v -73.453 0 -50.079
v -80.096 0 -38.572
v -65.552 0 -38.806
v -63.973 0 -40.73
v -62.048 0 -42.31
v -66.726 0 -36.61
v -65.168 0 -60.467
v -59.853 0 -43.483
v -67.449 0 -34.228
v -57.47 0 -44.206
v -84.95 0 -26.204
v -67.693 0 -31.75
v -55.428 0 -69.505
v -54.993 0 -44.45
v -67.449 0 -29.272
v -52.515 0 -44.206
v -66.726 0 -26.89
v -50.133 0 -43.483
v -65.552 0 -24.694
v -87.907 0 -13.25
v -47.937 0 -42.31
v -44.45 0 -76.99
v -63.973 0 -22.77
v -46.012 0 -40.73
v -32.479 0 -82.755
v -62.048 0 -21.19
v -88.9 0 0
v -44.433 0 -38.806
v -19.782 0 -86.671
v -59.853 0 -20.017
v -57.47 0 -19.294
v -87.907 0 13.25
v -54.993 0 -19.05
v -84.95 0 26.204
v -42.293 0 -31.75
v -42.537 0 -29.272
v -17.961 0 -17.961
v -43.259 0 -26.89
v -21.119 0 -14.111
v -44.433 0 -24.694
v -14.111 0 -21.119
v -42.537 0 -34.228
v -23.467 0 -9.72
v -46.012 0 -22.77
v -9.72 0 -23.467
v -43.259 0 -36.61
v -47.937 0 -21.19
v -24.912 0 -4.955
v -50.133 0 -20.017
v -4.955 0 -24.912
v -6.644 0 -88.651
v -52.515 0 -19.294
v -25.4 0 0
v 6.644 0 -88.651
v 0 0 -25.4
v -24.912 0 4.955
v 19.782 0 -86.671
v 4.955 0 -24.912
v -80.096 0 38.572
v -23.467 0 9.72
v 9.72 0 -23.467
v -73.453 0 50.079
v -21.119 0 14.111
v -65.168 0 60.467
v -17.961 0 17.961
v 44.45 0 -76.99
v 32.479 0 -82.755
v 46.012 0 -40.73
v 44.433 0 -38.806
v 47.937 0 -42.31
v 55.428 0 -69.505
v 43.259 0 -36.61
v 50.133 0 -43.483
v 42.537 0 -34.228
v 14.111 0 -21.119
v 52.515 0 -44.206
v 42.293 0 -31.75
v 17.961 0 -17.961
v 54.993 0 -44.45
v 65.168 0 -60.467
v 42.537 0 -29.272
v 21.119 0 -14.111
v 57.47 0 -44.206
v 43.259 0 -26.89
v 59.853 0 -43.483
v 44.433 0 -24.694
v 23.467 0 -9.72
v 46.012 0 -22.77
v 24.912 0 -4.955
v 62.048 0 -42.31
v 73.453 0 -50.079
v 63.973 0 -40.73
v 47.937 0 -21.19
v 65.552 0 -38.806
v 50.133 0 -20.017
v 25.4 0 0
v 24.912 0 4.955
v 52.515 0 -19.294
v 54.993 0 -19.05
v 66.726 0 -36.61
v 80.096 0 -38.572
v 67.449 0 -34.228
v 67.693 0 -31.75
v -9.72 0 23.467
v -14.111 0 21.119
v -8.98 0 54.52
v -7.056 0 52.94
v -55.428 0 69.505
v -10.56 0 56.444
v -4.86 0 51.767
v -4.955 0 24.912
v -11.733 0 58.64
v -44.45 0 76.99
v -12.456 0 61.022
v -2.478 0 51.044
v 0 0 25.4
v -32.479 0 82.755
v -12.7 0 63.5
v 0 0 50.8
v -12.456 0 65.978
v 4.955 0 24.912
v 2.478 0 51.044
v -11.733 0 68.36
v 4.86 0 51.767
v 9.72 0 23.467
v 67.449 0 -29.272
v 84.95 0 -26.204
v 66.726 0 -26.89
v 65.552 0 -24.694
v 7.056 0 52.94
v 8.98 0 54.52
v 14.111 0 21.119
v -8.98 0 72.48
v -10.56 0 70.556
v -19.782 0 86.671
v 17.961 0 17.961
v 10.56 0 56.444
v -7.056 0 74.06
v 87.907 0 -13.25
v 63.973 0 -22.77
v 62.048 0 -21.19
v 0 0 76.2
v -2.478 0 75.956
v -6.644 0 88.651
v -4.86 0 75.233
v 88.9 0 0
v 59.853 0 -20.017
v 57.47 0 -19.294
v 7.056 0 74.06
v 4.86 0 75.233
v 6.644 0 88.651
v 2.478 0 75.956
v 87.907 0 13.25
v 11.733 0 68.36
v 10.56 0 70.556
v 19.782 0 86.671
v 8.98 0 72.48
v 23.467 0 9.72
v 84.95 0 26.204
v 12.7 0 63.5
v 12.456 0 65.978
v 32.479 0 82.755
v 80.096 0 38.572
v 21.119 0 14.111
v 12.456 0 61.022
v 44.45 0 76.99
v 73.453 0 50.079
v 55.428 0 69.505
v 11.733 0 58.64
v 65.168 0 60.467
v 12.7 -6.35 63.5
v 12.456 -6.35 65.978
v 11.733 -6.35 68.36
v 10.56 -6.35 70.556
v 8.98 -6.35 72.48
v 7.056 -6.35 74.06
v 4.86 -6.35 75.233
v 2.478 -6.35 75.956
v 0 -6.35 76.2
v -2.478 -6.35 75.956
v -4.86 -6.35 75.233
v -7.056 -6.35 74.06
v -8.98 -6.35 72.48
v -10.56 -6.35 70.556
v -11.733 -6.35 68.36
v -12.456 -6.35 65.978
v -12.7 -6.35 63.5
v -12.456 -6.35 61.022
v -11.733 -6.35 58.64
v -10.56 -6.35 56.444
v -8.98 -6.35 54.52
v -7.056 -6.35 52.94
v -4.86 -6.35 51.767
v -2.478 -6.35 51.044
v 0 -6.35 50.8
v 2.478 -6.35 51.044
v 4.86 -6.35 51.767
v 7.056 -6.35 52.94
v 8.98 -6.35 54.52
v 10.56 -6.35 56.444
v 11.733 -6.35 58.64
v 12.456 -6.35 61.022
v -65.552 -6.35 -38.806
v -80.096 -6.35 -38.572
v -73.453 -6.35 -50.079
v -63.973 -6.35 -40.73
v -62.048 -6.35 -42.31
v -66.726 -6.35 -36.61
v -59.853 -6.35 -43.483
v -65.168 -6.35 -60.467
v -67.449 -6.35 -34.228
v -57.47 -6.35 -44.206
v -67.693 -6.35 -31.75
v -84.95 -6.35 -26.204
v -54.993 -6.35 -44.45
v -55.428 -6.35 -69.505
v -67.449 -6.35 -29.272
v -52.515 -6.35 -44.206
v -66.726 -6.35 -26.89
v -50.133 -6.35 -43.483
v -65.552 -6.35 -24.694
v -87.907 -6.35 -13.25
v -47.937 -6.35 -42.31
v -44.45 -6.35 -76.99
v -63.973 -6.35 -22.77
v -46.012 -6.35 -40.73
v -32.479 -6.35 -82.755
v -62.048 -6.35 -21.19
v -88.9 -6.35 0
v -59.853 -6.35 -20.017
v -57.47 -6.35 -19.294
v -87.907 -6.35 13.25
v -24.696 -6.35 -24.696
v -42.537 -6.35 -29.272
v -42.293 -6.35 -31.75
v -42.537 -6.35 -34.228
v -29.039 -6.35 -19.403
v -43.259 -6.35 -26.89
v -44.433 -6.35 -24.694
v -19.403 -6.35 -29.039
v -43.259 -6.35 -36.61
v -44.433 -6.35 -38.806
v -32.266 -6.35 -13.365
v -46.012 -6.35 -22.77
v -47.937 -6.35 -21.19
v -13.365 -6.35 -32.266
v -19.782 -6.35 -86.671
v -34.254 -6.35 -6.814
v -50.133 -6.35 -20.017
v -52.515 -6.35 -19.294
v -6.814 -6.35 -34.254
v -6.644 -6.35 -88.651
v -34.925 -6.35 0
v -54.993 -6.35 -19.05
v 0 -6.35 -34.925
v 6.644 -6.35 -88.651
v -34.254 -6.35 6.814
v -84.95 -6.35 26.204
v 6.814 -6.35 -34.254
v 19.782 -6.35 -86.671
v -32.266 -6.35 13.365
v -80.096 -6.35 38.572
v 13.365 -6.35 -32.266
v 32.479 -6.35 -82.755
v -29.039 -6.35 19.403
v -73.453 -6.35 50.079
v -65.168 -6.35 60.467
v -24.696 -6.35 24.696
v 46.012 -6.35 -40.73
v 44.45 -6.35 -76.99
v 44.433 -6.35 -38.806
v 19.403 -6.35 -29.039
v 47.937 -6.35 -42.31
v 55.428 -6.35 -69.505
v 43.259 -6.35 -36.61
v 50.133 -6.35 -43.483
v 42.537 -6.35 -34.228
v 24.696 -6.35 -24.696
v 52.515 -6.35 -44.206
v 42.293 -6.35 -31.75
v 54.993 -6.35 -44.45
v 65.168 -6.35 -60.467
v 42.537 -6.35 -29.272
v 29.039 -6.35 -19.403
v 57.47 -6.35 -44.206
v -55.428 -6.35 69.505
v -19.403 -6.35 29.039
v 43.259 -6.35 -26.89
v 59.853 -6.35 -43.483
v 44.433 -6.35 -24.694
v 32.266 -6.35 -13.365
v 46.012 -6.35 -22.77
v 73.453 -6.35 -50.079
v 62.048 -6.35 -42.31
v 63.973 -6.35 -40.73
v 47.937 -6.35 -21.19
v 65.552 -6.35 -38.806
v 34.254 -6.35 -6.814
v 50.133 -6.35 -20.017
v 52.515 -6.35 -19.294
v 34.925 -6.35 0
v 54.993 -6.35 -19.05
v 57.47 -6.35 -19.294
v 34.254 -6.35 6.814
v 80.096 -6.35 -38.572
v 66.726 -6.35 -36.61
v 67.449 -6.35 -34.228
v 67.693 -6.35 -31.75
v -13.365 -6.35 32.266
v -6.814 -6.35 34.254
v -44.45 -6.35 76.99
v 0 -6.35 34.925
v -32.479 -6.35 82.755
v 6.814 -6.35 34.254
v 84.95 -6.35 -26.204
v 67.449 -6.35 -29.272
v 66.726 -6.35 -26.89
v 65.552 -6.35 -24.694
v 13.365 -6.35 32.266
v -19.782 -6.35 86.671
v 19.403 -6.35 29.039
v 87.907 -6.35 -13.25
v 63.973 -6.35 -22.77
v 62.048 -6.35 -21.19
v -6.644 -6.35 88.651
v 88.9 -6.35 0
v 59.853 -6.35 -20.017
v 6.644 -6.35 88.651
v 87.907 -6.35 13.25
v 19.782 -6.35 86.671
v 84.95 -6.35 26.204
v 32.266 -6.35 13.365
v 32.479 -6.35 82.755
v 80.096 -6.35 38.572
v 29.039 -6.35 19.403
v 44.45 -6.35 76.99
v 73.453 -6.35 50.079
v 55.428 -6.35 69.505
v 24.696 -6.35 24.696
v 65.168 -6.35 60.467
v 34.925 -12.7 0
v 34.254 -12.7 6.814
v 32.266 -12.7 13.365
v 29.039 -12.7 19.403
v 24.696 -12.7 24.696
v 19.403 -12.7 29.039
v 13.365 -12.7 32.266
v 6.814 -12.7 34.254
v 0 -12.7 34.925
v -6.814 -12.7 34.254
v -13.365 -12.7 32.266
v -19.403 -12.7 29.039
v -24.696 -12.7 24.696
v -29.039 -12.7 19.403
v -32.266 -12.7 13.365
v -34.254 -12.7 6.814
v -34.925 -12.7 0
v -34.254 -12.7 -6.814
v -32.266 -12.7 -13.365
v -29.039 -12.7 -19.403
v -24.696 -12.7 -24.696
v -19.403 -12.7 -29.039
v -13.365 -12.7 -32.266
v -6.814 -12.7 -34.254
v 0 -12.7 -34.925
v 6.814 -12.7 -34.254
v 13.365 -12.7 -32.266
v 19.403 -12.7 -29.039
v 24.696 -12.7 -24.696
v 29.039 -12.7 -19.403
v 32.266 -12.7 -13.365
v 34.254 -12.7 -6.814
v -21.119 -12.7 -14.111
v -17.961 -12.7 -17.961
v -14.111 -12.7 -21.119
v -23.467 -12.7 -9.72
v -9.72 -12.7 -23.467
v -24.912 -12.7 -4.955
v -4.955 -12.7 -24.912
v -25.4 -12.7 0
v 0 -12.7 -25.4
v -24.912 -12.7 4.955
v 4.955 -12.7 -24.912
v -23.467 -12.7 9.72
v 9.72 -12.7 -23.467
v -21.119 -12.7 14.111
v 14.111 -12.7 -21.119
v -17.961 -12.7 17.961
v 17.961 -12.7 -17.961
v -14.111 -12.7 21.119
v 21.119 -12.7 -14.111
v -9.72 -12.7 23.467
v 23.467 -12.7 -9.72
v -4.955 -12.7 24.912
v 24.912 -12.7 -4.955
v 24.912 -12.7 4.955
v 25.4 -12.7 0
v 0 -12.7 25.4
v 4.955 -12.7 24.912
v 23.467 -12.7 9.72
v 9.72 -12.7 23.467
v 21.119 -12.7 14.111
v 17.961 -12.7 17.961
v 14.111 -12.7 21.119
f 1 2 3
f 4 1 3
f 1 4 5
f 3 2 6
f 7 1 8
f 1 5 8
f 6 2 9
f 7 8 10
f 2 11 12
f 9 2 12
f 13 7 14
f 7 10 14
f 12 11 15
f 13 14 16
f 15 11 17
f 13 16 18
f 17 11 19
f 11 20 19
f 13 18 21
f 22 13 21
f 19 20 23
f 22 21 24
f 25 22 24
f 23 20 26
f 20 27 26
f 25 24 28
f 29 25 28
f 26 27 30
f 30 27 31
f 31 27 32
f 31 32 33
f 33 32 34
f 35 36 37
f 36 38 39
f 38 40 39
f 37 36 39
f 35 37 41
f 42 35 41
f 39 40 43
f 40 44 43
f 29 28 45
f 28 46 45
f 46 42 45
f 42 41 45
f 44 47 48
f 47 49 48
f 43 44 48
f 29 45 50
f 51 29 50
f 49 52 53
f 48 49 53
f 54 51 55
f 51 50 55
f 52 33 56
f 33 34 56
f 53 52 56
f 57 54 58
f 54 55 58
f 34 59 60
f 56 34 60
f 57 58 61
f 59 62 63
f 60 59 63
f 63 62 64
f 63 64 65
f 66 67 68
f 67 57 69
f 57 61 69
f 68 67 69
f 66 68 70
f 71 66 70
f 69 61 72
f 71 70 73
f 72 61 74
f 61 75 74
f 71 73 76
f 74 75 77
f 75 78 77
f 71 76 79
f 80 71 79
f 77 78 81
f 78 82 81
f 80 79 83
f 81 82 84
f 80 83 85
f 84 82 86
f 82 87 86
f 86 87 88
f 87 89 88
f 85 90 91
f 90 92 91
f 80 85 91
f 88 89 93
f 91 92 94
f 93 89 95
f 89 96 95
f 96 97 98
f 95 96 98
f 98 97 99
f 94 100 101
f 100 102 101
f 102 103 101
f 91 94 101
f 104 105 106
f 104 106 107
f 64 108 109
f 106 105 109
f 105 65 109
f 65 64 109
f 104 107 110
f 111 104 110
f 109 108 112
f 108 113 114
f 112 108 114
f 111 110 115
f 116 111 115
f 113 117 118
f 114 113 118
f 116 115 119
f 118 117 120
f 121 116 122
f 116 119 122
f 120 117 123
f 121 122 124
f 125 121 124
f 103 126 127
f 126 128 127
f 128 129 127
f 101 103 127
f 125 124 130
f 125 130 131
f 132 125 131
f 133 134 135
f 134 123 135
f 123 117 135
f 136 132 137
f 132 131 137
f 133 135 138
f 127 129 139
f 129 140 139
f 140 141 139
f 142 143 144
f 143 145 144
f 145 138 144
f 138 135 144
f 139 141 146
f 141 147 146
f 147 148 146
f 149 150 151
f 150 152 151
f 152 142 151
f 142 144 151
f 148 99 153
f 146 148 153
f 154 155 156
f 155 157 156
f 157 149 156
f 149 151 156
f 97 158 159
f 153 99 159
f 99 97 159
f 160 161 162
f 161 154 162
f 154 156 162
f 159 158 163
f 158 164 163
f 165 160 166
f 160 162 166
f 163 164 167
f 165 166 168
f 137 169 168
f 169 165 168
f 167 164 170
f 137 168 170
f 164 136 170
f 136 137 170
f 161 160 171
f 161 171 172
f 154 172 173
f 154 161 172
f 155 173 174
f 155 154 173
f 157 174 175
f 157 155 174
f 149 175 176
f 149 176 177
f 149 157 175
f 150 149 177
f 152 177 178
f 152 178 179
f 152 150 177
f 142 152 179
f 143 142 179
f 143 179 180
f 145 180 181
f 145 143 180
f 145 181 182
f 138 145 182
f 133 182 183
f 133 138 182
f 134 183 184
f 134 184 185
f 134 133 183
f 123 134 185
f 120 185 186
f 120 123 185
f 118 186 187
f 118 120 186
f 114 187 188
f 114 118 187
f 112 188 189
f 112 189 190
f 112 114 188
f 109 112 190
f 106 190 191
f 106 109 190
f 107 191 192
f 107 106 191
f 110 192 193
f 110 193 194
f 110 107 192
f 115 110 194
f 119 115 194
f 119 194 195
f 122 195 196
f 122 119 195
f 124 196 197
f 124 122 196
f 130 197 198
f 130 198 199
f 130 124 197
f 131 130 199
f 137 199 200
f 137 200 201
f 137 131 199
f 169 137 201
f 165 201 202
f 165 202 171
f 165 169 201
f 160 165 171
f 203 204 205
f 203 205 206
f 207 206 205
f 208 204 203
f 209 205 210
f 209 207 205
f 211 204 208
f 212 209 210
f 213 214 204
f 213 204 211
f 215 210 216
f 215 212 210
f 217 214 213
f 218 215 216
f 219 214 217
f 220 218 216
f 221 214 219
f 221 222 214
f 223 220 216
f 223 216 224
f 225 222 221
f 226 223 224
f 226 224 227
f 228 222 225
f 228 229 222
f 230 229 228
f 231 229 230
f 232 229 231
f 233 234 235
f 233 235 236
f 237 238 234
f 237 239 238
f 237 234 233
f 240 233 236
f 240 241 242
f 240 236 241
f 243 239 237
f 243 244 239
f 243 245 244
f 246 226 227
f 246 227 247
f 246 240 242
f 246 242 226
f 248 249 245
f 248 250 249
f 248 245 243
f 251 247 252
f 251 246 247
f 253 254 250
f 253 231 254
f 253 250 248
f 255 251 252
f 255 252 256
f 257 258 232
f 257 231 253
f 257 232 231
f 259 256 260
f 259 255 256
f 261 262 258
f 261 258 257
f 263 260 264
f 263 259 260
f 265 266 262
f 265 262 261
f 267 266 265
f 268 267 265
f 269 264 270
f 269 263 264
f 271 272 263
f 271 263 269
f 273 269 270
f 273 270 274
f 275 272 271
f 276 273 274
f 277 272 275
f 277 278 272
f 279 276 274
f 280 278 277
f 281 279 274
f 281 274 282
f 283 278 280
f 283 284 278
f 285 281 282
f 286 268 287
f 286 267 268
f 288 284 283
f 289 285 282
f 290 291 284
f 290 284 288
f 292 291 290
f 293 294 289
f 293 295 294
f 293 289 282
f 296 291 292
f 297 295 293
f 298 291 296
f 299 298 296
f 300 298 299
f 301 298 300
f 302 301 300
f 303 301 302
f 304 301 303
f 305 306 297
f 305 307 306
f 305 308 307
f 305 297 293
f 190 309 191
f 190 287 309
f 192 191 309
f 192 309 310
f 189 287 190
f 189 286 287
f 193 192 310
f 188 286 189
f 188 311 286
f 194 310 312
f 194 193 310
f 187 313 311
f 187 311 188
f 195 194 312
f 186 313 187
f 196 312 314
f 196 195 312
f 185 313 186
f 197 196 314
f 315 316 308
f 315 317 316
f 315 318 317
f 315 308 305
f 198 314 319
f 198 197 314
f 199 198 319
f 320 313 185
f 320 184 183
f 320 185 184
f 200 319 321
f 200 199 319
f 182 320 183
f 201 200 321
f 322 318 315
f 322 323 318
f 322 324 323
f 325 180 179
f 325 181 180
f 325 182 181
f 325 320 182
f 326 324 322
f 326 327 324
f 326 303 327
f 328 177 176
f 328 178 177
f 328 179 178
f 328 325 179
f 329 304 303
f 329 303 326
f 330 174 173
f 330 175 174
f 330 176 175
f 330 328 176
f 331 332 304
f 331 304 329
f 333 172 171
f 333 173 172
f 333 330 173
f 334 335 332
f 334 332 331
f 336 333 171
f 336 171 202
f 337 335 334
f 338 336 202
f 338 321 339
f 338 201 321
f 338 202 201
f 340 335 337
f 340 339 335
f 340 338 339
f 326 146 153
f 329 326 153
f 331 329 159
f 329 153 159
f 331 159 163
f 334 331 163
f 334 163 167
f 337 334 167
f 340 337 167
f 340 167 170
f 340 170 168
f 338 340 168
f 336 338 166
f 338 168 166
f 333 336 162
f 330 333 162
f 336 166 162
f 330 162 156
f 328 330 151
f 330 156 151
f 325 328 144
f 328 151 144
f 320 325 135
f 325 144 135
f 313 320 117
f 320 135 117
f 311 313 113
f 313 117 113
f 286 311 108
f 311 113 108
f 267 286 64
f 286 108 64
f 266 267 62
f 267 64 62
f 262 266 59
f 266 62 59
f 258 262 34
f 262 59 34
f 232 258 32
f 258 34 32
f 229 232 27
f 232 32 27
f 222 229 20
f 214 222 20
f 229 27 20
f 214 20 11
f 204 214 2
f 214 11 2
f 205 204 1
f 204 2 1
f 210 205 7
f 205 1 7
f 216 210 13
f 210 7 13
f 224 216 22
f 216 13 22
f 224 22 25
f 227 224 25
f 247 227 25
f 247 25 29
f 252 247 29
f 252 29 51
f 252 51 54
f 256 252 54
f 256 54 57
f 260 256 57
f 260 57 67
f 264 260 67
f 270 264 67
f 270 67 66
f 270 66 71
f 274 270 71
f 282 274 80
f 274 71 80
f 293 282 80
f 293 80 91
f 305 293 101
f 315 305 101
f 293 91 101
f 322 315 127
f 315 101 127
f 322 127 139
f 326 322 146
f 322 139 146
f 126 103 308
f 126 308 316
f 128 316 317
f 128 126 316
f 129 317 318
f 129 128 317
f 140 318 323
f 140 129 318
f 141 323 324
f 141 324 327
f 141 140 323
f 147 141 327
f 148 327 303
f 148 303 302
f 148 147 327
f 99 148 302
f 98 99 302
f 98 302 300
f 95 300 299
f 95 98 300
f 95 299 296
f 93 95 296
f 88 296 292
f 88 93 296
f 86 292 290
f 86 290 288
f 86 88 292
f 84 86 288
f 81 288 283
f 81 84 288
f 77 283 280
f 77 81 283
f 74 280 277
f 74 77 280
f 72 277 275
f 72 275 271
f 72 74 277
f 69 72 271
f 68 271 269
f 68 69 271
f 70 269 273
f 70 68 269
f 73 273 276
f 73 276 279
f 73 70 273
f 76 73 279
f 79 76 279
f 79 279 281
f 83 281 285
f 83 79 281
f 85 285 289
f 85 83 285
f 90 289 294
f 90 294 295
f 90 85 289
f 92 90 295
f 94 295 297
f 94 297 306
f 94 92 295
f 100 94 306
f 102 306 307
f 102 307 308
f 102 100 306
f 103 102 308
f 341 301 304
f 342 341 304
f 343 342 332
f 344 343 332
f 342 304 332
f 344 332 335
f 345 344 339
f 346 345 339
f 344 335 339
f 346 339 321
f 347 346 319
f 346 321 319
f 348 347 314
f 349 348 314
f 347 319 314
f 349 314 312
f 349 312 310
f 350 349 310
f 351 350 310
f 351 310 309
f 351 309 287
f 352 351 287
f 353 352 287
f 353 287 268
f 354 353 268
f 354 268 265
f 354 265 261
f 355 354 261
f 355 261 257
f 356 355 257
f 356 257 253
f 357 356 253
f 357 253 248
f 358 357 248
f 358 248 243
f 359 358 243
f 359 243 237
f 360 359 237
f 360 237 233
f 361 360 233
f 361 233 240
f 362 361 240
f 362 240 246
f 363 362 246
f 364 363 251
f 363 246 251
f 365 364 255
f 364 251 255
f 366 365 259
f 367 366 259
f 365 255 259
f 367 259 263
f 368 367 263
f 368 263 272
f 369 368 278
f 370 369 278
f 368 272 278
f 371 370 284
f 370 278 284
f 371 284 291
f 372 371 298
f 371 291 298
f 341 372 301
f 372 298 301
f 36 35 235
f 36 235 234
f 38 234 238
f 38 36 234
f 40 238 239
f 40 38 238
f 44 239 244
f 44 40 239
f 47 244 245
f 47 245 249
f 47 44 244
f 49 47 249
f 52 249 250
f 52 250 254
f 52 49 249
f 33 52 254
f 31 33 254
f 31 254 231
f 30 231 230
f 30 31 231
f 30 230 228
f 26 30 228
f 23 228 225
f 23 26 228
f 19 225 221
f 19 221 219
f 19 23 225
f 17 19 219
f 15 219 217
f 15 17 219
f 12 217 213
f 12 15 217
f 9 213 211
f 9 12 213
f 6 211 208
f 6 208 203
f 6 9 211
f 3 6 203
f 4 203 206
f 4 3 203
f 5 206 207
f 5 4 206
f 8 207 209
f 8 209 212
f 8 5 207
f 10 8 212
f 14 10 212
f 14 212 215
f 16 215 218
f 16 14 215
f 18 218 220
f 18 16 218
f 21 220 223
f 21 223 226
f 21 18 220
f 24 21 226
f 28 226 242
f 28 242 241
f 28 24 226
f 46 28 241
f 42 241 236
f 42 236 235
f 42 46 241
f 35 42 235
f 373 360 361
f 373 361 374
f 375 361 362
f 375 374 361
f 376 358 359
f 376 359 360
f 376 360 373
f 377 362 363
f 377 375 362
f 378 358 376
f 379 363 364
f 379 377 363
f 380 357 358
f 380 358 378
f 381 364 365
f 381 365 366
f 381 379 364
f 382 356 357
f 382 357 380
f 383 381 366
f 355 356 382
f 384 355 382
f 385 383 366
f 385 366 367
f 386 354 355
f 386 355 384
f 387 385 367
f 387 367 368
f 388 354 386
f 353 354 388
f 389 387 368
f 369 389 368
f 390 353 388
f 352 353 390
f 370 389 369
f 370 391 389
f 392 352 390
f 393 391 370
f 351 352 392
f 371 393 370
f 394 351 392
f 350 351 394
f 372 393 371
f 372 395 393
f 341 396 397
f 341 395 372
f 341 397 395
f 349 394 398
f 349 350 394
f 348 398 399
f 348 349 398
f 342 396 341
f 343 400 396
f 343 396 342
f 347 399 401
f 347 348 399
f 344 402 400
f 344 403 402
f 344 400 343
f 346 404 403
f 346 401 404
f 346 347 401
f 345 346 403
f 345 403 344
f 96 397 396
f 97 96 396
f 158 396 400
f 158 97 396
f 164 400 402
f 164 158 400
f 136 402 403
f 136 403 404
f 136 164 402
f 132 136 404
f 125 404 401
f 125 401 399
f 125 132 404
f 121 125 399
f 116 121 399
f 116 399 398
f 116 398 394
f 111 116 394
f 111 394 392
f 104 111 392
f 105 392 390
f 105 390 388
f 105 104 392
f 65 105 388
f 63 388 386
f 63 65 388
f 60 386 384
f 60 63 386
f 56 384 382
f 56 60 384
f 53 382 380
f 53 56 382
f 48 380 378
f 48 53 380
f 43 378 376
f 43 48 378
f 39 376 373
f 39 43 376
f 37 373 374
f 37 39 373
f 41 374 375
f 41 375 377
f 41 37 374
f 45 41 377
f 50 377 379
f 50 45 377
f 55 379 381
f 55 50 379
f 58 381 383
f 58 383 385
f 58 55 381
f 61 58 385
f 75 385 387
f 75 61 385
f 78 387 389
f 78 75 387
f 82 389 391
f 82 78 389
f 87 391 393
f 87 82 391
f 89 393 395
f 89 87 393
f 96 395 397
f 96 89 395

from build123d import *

# Parameters (mm, degrees)
F0_R     = 88.9
F0_R_2   = 12.7
F0_R_3   = 34.925
F1_DEPTH = 6.35
F0_R_4   = 25.4
F2_DEPTH = 12.7


with BuildPart() as f1:
    # F0 (on Front) → F1 (new body)
    with BuildSketch(Plane.XZ):
        Circle(F0_R)
        with Locations((-54.992613, -31.75)):
            Circle(F0_R_2, mode=Mode.SUBTRACT)
        with Locations((54.992613, -31.75)):
            Circle(F0_R_2, mode=Mode.SUBTRACT)
        Circle(F0_R_3, mode=Mode.SUBTRACT)
        with Locations((0, 63.5)):
            Circle(F0_R_2, mode=Mode.SUBTRACT)
    extrude(amount=F1_DEPTH)

    # F0 (on Front) → F2 (join)
    with BuildSketch(Plane.XZ):
        Circle(F0_R_3)
        Circle(F0_R_4, mode=Mode.SUBTRACT)
    extrude(amount=F2_DEPTH)


solid = f1.part
